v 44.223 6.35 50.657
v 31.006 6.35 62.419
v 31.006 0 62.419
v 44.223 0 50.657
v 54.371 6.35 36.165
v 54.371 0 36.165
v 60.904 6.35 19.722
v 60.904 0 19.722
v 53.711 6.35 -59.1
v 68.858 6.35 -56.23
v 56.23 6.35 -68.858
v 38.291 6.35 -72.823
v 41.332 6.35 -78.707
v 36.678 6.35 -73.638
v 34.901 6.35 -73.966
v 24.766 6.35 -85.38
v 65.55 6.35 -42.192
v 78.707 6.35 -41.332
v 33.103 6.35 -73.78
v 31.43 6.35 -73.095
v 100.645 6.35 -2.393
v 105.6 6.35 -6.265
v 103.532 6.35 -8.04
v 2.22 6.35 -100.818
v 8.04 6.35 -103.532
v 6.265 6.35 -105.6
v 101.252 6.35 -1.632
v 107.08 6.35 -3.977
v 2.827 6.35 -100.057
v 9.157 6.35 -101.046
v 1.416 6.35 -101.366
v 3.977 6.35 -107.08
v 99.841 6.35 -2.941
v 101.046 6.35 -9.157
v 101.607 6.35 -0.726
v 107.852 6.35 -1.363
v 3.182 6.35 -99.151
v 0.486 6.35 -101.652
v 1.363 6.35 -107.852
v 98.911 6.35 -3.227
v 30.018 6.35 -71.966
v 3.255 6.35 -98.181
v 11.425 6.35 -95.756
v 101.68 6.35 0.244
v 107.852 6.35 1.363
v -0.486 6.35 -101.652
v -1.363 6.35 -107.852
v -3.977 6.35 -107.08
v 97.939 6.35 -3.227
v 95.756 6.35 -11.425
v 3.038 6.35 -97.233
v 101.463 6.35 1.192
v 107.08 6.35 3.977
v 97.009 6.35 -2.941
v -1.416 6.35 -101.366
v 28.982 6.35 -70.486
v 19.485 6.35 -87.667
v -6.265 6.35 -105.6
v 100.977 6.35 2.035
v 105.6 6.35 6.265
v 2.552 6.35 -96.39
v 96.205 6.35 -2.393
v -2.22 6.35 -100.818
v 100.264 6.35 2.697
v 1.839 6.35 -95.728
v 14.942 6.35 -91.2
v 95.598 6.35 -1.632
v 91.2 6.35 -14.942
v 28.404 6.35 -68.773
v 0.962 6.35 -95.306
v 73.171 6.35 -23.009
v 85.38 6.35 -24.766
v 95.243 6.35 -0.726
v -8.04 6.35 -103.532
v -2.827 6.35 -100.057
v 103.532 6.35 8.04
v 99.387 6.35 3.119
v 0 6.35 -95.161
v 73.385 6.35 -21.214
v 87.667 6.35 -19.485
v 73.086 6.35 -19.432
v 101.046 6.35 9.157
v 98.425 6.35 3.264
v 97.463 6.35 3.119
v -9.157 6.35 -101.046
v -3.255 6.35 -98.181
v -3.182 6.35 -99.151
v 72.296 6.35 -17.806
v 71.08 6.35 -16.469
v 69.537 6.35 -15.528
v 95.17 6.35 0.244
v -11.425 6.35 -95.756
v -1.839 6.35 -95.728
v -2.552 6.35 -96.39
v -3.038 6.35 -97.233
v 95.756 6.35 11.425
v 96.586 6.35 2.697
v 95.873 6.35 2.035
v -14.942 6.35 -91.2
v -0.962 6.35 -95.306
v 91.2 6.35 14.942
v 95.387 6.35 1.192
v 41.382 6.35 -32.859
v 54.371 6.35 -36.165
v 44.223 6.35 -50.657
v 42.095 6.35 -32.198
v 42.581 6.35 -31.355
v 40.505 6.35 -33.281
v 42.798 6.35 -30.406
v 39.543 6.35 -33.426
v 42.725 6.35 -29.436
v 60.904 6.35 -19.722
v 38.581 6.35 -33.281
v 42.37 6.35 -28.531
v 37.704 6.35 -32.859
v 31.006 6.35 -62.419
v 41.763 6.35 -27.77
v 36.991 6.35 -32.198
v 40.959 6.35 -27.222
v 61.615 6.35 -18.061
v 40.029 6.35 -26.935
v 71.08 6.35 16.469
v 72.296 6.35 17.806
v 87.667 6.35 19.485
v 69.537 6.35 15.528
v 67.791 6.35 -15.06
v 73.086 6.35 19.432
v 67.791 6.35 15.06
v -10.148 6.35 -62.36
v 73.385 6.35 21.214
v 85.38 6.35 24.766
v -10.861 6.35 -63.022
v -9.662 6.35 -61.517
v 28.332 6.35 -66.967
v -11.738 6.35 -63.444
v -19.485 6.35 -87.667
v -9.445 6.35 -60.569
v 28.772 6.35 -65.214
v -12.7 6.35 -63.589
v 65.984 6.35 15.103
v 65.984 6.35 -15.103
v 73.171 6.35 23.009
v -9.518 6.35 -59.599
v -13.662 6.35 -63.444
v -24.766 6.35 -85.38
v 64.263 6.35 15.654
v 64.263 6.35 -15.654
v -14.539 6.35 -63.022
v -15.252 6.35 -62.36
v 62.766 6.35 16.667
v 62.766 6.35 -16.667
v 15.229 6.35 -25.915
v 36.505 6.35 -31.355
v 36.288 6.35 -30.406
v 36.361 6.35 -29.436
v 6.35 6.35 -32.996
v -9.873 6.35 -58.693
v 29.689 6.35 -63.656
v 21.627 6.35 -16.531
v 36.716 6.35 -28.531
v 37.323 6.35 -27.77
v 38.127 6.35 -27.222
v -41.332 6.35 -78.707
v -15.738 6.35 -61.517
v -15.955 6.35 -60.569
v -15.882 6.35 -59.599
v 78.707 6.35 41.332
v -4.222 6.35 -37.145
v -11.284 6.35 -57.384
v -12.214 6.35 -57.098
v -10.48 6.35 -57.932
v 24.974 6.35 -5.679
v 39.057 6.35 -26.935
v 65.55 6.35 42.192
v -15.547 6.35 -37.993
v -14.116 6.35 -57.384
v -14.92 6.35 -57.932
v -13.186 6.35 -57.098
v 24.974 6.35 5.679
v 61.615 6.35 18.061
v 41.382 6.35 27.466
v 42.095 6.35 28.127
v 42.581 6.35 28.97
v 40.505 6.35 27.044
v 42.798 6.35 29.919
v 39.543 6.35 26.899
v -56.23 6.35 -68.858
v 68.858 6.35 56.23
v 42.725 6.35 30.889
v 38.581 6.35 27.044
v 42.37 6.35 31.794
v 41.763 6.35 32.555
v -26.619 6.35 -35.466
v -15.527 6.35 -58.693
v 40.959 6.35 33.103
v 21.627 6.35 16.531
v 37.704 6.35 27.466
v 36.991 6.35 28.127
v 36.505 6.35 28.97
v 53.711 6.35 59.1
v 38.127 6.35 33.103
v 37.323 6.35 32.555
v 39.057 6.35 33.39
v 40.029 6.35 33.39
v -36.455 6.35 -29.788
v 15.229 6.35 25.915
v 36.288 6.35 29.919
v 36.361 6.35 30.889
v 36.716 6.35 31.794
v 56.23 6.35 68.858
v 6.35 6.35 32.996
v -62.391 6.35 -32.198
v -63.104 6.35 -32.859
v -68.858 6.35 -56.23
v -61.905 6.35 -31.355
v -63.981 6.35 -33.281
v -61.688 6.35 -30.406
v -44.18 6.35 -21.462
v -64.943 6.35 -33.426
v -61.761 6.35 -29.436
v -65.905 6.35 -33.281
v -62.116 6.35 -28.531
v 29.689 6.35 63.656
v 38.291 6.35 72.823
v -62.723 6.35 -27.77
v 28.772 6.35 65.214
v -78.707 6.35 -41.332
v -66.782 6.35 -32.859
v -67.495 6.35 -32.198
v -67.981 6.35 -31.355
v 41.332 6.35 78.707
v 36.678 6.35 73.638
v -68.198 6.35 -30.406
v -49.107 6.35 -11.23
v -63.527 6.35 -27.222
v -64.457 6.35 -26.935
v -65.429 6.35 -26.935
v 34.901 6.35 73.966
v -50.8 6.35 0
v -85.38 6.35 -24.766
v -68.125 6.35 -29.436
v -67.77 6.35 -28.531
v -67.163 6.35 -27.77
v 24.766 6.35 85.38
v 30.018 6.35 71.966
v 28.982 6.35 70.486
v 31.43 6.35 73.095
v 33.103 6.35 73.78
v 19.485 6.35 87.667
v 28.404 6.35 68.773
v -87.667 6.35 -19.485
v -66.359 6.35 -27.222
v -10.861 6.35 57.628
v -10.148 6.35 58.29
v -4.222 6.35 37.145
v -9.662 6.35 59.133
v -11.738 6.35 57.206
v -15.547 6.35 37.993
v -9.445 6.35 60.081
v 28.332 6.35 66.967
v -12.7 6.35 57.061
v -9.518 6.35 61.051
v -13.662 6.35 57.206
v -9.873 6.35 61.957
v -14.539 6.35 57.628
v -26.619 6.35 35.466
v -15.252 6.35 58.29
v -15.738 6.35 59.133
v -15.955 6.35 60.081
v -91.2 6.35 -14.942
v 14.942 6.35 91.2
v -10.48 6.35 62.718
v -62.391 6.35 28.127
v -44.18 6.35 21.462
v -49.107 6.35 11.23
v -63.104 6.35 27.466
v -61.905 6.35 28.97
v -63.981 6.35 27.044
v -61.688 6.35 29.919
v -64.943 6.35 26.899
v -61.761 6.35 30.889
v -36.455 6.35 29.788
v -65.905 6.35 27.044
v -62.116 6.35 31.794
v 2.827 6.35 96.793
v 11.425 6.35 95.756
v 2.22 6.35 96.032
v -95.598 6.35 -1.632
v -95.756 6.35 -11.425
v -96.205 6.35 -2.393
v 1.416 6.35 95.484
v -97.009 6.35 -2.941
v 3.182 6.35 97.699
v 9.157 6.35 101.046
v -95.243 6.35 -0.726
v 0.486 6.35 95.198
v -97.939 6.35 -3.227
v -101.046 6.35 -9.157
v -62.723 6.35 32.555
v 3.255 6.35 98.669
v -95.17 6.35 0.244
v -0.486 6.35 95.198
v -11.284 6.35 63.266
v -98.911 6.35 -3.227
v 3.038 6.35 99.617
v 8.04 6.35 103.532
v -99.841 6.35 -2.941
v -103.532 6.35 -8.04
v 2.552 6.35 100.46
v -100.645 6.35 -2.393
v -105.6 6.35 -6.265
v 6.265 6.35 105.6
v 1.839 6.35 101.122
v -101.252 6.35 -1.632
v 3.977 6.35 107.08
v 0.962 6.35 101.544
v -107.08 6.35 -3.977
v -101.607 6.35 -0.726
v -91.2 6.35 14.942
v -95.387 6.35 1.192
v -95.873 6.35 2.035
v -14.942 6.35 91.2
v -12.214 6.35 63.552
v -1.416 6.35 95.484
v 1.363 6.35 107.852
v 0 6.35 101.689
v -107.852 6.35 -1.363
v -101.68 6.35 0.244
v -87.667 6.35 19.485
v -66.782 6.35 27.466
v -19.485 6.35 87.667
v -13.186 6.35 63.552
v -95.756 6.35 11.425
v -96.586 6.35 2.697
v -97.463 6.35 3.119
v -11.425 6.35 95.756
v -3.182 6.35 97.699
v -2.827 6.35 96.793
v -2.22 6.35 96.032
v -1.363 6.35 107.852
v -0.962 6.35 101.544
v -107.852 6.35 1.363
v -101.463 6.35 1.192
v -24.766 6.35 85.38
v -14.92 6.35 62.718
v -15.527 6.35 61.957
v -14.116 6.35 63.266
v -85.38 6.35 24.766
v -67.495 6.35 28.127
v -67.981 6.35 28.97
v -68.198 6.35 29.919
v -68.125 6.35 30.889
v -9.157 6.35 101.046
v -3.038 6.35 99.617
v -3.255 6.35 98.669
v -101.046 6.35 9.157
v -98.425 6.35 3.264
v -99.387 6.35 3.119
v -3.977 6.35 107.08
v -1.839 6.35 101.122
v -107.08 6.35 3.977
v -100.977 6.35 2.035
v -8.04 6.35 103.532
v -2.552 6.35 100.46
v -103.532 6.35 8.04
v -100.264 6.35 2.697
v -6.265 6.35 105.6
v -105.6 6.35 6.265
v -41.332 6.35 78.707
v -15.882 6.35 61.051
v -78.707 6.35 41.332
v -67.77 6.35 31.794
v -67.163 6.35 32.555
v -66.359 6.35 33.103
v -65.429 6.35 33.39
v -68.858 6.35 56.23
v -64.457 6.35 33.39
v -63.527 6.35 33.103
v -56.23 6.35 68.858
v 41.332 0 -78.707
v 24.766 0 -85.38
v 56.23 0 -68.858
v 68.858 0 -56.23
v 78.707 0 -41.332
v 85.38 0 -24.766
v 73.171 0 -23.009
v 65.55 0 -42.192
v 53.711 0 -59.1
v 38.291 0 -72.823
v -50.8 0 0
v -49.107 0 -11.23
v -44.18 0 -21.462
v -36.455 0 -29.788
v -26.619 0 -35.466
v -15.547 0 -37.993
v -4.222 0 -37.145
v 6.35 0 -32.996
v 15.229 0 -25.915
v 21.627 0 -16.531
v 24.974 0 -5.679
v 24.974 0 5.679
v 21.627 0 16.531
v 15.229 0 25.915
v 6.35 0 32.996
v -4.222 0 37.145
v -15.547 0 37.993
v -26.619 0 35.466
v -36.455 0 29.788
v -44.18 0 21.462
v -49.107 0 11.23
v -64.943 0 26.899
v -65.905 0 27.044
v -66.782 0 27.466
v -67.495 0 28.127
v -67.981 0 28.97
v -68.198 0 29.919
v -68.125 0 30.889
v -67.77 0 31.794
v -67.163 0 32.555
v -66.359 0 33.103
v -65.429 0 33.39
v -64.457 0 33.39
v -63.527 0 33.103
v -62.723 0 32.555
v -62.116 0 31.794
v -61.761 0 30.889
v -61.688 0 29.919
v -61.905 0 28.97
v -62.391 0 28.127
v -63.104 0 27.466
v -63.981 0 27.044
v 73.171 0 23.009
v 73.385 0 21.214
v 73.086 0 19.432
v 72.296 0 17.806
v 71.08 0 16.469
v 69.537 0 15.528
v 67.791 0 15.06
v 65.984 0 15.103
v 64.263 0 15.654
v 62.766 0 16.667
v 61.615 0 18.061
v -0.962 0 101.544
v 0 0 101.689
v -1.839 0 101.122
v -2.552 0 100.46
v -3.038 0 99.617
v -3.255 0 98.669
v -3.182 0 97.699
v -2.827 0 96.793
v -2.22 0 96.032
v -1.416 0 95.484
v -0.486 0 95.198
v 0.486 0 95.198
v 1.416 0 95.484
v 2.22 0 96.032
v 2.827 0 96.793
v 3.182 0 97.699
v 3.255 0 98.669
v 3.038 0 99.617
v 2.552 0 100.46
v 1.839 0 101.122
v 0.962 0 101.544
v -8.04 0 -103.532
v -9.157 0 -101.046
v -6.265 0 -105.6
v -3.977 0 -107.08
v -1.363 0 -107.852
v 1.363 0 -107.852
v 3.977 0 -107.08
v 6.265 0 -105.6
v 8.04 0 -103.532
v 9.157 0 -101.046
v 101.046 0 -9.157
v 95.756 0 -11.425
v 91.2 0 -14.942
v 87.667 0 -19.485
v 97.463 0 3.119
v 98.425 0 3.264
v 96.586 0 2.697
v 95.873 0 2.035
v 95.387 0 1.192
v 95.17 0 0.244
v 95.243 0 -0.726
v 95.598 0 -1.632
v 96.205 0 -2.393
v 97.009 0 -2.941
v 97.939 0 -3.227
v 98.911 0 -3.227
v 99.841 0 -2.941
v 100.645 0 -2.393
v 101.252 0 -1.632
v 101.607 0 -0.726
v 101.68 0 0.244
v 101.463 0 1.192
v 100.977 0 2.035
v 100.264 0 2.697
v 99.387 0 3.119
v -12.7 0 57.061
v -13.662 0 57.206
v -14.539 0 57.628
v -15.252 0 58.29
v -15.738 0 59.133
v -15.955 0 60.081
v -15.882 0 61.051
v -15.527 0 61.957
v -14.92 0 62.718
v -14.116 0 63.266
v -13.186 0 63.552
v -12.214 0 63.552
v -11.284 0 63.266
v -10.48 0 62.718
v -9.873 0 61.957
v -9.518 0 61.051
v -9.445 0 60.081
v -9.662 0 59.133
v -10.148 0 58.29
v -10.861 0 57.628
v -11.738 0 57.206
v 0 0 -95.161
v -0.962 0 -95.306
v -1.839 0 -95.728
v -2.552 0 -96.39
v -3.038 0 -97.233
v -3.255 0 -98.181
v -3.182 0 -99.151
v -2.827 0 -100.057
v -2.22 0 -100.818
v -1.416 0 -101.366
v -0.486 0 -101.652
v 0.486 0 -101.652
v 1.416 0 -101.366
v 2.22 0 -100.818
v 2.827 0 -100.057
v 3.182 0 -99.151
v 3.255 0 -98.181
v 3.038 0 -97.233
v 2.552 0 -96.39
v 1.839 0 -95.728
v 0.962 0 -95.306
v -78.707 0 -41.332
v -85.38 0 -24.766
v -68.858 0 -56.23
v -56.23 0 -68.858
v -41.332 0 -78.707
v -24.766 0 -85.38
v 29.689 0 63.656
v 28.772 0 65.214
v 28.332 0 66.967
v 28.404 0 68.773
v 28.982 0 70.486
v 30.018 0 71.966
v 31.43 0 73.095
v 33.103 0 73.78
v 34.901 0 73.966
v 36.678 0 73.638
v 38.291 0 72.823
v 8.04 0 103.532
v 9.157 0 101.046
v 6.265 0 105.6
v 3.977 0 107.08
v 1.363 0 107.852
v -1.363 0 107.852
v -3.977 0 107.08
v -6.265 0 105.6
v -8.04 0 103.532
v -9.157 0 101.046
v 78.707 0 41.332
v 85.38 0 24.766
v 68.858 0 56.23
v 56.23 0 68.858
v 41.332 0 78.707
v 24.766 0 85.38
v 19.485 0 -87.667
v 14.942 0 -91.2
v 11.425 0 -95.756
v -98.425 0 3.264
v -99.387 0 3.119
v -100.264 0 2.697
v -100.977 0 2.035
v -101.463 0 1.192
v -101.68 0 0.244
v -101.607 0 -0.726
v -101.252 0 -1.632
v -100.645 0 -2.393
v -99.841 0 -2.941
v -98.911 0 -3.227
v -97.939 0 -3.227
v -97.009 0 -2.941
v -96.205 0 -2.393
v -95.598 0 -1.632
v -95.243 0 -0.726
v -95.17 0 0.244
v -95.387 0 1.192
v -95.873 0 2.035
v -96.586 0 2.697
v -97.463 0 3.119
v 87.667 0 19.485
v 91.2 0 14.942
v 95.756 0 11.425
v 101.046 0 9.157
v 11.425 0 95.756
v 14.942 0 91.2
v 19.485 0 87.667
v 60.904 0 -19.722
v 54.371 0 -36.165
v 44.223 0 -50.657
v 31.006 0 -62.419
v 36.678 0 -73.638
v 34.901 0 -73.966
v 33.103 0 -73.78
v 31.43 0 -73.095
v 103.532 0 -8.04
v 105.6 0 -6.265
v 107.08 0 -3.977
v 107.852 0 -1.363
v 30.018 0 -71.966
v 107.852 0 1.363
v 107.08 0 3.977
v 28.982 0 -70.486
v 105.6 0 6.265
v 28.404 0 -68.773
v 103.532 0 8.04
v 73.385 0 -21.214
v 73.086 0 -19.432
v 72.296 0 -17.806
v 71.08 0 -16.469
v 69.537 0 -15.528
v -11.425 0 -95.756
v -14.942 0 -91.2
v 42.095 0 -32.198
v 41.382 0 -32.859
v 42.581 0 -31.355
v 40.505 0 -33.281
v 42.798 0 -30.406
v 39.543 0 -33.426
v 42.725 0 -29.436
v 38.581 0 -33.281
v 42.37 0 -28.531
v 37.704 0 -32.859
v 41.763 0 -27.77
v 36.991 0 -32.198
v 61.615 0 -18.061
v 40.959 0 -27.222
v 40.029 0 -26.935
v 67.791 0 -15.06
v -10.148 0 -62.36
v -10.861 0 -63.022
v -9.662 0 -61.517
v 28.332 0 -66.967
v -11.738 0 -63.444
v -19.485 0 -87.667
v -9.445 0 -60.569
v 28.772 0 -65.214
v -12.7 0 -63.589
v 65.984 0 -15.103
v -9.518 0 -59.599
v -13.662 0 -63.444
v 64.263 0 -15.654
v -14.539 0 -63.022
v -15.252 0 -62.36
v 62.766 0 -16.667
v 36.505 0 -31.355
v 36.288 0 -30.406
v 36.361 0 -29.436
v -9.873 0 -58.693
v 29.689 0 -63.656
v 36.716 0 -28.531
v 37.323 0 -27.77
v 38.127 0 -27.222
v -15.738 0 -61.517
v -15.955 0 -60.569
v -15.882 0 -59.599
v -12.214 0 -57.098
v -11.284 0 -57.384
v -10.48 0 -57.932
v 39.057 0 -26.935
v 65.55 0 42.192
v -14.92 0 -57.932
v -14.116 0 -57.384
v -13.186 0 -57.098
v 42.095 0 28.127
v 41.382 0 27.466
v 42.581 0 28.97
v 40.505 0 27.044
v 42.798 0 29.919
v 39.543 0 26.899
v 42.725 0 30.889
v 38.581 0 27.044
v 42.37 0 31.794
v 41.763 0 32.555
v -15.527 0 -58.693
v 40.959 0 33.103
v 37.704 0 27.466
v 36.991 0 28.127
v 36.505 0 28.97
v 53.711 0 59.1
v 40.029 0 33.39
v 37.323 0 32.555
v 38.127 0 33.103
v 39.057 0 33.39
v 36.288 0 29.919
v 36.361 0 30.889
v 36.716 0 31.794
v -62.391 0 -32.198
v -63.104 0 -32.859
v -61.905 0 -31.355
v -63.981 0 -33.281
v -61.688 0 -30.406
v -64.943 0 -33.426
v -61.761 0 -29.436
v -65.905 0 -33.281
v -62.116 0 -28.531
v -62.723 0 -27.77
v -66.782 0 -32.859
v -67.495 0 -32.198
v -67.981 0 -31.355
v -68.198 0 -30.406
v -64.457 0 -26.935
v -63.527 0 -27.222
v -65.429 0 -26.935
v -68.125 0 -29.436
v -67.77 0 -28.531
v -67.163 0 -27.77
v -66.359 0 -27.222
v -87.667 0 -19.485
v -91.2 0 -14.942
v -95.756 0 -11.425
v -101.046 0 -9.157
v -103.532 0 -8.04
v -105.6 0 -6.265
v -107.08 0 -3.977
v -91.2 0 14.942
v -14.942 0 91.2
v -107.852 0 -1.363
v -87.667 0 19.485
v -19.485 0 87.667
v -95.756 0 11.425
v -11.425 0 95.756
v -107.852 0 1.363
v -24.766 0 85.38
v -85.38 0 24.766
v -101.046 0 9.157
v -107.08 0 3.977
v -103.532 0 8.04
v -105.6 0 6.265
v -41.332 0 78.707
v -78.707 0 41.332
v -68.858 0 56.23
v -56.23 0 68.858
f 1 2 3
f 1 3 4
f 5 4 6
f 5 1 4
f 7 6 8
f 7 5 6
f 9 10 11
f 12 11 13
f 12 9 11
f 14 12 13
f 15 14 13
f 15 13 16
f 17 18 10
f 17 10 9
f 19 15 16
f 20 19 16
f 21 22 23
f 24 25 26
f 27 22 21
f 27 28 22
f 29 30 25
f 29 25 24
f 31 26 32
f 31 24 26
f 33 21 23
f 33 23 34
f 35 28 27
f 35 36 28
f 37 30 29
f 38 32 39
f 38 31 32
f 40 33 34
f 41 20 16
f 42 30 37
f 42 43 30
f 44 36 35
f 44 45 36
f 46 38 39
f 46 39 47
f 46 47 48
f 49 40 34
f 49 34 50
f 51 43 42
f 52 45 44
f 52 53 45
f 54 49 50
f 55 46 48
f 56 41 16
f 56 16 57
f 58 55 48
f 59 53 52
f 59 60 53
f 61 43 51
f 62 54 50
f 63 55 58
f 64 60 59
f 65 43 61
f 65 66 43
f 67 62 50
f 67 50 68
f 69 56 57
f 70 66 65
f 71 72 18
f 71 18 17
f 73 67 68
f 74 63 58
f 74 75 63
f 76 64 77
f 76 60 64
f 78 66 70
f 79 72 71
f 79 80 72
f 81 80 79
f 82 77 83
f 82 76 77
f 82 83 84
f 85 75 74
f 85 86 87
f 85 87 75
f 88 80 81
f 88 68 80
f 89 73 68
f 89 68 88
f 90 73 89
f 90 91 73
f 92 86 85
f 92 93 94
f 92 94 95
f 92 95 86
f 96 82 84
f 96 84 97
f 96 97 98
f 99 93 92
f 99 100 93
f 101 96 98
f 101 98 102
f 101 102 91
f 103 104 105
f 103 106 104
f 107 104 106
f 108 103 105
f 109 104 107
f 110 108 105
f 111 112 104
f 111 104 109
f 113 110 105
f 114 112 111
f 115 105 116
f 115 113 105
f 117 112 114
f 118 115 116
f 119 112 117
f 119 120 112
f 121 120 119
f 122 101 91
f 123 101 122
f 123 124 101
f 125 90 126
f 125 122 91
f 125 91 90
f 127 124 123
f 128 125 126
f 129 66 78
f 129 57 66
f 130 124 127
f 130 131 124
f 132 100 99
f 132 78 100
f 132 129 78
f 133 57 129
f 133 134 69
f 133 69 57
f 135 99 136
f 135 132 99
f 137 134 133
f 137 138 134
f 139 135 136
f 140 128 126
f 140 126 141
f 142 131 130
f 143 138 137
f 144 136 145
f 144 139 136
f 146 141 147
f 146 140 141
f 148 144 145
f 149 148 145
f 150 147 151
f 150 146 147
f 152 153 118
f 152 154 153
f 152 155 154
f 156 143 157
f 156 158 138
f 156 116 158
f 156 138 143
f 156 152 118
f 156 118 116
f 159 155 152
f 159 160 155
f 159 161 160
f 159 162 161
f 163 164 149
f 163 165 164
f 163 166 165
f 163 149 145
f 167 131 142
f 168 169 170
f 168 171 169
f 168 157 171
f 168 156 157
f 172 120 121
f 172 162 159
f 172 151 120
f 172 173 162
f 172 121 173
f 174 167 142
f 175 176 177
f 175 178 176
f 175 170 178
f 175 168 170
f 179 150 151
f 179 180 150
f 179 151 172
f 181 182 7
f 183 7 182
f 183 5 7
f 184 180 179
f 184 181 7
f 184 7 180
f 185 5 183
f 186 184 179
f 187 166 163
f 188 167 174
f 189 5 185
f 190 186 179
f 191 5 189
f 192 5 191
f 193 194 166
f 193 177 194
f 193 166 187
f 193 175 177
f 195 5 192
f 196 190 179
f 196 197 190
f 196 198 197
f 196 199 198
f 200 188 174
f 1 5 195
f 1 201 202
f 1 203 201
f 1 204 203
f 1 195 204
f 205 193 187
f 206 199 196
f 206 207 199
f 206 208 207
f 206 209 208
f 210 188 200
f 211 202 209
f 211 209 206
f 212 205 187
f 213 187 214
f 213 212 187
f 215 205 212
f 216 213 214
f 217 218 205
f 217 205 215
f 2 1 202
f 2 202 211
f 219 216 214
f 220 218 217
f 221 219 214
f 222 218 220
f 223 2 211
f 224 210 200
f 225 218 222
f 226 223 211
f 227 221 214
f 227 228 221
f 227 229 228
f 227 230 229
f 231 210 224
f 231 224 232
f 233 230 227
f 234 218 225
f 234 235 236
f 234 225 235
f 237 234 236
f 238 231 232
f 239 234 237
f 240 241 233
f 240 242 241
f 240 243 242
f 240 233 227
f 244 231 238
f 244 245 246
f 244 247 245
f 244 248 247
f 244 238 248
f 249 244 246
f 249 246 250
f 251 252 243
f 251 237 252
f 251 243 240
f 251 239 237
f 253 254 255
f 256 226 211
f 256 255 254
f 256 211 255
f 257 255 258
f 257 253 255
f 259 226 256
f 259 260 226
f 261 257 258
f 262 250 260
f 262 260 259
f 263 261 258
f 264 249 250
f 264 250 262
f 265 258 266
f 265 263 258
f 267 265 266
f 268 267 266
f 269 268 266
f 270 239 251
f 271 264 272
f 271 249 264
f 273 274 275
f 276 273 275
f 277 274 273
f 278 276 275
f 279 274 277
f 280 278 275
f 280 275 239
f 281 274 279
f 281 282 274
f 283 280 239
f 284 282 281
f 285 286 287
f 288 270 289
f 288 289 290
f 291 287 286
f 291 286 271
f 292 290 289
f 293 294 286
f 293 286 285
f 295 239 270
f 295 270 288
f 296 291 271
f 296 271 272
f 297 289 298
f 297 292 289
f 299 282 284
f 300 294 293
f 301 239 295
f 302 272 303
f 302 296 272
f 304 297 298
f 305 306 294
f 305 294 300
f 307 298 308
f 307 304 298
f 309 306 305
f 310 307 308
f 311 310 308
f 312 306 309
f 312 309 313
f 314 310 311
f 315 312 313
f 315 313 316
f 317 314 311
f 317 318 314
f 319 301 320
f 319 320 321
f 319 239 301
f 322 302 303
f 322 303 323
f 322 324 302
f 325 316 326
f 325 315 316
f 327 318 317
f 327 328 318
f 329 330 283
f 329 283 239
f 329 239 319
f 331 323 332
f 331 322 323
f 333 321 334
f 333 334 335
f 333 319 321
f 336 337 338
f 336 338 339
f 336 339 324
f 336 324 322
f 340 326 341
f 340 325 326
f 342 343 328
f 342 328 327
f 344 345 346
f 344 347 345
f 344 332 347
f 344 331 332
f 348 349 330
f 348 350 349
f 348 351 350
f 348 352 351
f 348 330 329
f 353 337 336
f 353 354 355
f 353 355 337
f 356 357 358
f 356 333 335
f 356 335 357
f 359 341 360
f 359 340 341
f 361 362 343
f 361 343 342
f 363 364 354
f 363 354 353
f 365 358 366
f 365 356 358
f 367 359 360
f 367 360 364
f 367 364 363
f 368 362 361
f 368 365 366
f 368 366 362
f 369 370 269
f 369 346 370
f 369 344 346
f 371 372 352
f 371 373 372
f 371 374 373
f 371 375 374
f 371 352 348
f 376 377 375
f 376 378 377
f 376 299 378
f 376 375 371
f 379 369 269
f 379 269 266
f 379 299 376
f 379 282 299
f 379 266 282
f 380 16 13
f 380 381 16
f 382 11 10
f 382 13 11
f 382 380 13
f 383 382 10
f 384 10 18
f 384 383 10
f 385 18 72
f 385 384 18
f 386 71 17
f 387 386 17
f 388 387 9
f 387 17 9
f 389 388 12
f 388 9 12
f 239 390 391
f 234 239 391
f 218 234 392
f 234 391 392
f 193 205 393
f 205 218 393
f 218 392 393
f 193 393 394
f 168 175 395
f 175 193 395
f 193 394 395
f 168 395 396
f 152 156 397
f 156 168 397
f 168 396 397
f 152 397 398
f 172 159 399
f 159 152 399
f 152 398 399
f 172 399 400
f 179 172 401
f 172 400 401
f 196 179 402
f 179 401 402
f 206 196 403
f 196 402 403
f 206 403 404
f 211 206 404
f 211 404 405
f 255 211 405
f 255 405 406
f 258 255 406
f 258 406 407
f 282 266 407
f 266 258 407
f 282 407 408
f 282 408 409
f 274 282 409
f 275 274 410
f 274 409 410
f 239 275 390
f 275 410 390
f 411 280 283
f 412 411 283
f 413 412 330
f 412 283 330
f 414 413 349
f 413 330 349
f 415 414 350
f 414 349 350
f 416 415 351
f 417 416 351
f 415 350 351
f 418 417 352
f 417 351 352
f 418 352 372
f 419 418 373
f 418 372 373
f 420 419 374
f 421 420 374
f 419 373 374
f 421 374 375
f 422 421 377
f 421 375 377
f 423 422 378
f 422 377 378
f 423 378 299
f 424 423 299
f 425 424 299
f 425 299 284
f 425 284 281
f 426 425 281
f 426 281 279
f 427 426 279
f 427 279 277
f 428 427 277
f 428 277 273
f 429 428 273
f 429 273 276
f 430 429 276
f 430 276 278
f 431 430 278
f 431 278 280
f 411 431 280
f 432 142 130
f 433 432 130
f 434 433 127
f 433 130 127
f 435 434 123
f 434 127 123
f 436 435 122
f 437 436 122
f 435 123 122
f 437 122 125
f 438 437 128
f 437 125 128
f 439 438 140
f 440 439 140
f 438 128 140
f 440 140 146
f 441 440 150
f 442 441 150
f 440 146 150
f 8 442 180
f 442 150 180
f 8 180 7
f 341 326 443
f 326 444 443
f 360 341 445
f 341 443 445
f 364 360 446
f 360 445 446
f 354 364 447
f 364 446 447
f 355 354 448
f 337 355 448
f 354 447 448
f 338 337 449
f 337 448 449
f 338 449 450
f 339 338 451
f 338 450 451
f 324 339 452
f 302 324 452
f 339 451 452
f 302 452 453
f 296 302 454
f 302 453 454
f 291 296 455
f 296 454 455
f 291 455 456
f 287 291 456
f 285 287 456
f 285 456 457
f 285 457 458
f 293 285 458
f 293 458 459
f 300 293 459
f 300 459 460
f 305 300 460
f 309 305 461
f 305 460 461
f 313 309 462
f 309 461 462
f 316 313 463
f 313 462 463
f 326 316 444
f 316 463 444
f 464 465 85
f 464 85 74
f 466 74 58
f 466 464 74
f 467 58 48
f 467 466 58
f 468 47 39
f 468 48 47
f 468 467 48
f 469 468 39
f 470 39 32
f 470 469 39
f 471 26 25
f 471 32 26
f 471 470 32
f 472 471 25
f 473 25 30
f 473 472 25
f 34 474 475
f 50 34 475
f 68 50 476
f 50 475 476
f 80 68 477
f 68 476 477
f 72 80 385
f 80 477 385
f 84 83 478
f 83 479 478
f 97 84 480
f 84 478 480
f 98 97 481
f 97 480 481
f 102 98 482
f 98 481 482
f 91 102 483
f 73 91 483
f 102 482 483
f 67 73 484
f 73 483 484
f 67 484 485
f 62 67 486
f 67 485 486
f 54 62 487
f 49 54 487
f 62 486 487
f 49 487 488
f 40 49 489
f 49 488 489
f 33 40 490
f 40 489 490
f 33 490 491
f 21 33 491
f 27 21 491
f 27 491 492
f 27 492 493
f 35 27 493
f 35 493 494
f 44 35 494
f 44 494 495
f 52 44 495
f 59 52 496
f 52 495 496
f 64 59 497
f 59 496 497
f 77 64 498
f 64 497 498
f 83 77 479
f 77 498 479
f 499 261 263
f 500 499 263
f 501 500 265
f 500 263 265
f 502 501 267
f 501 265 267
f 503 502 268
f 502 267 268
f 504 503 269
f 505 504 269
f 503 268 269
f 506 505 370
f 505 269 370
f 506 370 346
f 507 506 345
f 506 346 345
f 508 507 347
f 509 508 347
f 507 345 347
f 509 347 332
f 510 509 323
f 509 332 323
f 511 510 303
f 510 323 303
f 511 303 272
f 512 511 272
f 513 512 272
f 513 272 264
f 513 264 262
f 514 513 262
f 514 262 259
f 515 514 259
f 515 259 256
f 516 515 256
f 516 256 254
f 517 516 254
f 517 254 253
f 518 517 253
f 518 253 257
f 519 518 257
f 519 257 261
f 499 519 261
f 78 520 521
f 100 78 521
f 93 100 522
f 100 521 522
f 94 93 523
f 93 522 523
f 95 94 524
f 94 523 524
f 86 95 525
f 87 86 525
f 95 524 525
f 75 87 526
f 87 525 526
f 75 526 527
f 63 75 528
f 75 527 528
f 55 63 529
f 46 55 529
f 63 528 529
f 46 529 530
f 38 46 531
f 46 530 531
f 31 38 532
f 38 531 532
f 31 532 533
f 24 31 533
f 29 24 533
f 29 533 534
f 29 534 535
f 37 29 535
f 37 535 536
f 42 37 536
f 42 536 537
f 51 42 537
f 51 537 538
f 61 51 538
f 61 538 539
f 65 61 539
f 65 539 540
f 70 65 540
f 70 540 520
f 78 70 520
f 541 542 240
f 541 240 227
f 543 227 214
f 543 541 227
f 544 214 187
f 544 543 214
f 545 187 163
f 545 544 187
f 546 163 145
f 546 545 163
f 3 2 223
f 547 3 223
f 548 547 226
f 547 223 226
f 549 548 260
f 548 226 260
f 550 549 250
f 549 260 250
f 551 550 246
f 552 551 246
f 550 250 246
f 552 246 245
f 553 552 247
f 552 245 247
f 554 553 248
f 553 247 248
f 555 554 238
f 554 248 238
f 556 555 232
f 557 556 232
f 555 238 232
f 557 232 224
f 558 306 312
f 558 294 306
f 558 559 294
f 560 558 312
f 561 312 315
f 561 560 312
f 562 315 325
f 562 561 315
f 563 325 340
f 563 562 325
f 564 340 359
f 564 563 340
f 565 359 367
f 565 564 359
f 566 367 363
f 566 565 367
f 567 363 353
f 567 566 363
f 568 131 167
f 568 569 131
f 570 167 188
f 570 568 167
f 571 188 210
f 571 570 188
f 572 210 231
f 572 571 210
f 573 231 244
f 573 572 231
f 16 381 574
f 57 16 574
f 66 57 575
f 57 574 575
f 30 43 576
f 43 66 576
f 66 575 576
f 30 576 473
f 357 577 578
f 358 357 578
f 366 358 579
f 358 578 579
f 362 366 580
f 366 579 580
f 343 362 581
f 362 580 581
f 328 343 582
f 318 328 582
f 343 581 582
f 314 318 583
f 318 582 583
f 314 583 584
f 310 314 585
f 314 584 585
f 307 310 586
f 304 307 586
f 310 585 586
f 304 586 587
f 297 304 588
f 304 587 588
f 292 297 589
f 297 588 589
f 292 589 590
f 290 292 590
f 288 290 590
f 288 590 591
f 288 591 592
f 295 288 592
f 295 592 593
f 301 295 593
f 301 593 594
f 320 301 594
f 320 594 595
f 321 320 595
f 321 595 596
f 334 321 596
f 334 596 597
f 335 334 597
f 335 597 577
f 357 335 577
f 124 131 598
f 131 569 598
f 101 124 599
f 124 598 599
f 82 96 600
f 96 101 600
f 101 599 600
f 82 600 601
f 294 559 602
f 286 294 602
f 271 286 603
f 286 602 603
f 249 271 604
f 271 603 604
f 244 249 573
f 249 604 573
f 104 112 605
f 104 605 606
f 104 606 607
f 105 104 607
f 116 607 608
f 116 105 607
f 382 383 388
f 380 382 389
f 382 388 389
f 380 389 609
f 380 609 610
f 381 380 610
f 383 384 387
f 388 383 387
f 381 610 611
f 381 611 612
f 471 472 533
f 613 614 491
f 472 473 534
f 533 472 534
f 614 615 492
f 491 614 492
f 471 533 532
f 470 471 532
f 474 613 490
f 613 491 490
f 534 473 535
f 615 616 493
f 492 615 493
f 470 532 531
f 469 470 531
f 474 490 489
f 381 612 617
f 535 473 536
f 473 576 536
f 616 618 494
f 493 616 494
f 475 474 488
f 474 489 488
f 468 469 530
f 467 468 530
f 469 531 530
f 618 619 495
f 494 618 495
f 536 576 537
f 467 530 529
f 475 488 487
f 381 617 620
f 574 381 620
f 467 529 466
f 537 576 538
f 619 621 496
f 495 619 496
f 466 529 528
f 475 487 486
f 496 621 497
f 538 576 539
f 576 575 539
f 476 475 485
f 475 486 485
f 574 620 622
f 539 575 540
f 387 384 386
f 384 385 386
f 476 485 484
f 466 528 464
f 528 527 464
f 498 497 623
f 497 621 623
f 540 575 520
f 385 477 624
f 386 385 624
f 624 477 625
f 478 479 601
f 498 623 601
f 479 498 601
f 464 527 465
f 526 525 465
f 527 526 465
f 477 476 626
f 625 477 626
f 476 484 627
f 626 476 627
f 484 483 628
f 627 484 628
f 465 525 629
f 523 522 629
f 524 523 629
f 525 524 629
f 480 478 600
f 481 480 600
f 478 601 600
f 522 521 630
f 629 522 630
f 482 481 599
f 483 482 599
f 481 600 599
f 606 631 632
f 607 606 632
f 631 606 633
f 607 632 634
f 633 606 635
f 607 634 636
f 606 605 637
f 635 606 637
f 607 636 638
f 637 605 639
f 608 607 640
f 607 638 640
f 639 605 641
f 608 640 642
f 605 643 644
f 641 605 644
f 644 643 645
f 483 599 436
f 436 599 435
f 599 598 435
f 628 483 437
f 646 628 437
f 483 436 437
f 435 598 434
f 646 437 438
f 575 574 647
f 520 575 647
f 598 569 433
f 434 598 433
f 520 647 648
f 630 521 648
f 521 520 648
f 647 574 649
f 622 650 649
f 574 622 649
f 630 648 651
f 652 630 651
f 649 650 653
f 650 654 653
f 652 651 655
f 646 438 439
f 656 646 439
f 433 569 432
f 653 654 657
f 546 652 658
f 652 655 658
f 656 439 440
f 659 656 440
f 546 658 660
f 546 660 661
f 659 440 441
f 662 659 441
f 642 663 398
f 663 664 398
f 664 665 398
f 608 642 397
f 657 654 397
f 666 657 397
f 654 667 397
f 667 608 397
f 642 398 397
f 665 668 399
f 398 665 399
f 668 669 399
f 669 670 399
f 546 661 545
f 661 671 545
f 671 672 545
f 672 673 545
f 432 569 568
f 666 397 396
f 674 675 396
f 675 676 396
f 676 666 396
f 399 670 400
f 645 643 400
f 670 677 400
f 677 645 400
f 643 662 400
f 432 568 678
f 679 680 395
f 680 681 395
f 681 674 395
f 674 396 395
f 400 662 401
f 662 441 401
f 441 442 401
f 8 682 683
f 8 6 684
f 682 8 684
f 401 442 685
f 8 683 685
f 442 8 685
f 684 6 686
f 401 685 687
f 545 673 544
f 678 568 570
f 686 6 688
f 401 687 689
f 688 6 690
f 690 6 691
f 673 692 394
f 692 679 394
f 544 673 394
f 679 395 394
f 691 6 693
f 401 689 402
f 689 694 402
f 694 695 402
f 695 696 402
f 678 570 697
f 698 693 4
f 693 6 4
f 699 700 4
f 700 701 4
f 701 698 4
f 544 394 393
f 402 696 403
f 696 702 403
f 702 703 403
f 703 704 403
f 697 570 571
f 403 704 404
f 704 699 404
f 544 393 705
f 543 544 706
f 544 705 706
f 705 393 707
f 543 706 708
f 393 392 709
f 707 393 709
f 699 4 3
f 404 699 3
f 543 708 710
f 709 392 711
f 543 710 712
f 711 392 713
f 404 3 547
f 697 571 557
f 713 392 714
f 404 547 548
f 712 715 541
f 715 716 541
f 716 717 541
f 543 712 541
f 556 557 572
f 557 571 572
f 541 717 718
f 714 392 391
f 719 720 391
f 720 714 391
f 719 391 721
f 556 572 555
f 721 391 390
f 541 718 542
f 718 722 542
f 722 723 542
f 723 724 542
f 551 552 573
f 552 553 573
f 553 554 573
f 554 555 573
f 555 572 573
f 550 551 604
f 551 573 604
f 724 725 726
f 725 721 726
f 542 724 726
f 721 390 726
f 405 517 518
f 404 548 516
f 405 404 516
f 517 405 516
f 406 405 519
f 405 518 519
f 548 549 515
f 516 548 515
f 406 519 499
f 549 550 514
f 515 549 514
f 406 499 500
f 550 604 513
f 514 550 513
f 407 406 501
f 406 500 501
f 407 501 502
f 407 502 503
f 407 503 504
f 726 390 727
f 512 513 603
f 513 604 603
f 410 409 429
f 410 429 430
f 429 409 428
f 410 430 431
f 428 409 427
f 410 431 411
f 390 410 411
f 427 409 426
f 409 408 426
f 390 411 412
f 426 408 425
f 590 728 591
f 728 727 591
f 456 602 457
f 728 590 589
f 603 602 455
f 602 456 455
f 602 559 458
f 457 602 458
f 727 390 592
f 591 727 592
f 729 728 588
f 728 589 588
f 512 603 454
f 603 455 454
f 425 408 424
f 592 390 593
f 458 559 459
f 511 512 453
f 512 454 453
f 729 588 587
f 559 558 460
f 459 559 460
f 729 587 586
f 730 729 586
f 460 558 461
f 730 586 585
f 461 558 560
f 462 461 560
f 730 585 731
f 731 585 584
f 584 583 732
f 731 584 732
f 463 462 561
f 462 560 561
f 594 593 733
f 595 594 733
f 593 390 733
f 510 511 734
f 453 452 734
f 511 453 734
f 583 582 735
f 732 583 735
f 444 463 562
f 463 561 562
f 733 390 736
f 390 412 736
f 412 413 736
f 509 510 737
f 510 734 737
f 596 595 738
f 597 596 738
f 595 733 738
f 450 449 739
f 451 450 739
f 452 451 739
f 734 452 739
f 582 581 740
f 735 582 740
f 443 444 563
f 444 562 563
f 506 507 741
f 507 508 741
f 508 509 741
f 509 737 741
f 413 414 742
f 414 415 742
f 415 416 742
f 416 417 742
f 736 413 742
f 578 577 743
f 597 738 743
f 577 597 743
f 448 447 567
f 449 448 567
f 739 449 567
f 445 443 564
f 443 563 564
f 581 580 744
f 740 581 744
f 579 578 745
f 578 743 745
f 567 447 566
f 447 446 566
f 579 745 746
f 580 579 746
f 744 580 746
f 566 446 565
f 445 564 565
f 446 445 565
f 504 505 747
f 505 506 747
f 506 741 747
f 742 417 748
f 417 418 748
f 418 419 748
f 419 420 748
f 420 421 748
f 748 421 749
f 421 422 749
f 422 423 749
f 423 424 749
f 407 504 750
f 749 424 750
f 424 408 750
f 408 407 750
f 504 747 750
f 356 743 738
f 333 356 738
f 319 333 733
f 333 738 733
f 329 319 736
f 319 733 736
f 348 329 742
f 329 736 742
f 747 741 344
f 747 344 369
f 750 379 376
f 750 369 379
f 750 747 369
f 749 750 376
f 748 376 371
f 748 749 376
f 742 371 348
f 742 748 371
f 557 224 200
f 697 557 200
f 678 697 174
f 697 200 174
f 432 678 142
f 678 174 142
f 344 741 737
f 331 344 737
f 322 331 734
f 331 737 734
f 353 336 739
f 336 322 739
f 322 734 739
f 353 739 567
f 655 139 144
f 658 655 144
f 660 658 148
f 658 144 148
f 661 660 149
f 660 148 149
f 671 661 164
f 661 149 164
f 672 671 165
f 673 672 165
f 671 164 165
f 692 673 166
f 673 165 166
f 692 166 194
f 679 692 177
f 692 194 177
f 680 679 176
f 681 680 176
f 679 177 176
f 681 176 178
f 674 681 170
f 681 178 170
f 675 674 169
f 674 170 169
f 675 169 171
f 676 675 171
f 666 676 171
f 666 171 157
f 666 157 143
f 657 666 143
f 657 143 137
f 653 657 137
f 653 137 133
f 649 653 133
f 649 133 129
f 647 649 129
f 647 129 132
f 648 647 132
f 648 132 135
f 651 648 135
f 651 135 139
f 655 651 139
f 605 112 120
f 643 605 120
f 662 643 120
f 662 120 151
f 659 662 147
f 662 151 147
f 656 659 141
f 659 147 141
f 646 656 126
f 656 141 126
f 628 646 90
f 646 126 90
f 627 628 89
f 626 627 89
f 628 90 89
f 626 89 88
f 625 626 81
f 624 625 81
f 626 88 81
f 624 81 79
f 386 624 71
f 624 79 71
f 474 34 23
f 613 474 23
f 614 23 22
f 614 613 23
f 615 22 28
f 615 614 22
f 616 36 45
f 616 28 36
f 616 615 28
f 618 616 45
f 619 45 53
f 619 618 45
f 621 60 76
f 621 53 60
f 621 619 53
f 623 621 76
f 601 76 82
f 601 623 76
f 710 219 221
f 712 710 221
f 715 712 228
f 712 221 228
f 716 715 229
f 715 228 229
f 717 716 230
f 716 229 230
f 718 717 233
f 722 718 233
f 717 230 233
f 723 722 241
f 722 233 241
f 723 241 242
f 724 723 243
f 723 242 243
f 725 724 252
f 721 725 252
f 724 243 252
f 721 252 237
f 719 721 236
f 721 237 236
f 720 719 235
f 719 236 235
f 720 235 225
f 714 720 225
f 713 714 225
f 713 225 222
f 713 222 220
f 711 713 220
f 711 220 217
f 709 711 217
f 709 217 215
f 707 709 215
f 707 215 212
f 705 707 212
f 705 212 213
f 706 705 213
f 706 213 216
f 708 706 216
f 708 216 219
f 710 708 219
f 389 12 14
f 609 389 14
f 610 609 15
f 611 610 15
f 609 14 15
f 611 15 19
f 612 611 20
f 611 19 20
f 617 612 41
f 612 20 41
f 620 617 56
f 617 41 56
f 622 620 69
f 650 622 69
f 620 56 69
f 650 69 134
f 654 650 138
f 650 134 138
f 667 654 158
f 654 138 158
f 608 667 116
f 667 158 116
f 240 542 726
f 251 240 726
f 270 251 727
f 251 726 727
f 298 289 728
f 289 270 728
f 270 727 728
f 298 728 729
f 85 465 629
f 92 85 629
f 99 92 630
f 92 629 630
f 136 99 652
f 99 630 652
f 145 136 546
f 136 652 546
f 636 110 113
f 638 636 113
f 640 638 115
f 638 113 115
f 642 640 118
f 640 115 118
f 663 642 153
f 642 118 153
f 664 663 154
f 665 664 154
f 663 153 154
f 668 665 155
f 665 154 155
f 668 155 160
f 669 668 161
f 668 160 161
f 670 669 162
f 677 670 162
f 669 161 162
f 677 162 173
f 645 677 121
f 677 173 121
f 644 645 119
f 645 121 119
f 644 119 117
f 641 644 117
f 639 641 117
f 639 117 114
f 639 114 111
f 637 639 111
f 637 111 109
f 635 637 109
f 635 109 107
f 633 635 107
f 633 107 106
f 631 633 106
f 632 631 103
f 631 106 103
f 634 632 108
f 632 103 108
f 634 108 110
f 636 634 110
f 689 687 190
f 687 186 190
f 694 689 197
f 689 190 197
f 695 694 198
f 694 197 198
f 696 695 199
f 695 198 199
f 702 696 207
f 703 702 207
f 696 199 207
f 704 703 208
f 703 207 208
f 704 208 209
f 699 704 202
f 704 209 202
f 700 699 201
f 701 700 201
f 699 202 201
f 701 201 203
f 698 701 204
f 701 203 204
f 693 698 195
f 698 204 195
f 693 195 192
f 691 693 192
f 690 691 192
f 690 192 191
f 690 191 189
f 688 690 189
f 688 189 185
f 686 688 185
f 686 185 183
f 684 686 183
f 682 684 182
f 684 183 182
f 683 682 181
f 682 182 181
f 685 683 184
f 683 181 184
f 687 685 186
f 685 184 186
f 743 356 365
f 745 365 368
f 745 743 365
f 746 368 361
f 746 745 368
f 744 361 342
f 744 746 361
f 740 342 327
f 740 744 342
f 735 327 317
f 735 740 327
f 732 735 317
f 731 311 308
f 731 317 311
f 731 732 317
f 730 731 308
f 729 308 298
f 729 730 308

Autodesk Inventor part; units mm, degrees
ref_plane "YZ Plane" through (0, 0, 0) normal (1, 0, 0) x (0, 1, 0)
ref_plane "XZ Plane" through (0, 0, 0) normal (0, 1, 0) x (-1, 0, 0)
ref_plane "XY Plane" through (0, 0, 0) normal (0, 0, 1) x (1, 0, 0)
sketch "Sketch1" plane through (0, 0, 0) normal (0, 1, 0) x (-1, 0, 0)
  circle A0 centre (12.7, 0) radius 38.1
  circle A1 centre (0, 0) radius 88.9
  circle A2 centre (0, 98.425) radius 9.525
  arc A3 (9.1574, 101.0457) -> (24.7665, 85.3805) centre (31.1351, 107.3355) ccw
  arc A4 (-24.7665, 85.3805) -> (-9.1574, 101.0457) centre (-31.1351, 107.3355) ccw
  circle A5 centre (-98.425, 0) radius 9.525
  circle A6 centre (0, -98.425) radius 9.525
  circle A7 centre (98.425, 0) radius 9.525
  arc A8 (85.3805, 24.7665) -> (101.0457, 9.1574) centre (107.3355, 31.1351) ccw
  arc A9 (24.7665, -85.3805) -> (9.1574, -101.0457) centre (31.1351, -107.3355) ccw
  arc A10 (-9.1574, -101.0457) -> (-24.7665, -85.3805) centre (-31.1351, -107.3355) ccw
  arc A11 (-85.3805, -24.7665) -> (-101.0457, -9.1574) centre (-107.3355, -31.1351) ccw
  arc A12 (-101.0457, 9.1574) -> (-85.3805, 24.7665) centre (-107.3355, 31.1351) ccw
  arc A13 (101.0457, -9.1574) -> (85.3805, -24.7665) centre (107.3355, -31.1351) ccw
  line L0 (98.425, 0) -> (88.9, 0)
  line L1 (0, 98.425) -> (0, 88.9)
  line L2 (0, -98.425) -> (0, -88.9)
  line L3 (-98.425, 0) -> (-88.9, 0)
  line L4 (12.7, 0) -> (0, 0)
  dimension "d20" = 177.8
  dimension "d0" = 76.2
  dimension "d2" = 19.05
  dimension "d3" = 22.86
  dimension "d21" = 12.7
extrude "Extrusion1" add sketch "Sketch1" along normal blind 6.35
sketch "Sketch3" plane through (0, 6.35, 0) normal (0, 1, 0) x (1, 0, 0)
  circle A0 centre (-12.7, 0) radius 38.1 projected
  arc A1 (101.0457, -9.1574) -> (101.0457, 9.1574) centre (98.425, 0) ccw projected
  arc A2 (101.0457, -9.1574) -> (85.3805, -24.7665) centre (107.3355, -31.1351) ccw projected
  arc A3 (24.7665, -85.3805) -> (85.3805, -24.7665) centre (0, 0) ccw projected
  arc A4 (24.7665, -85.3805) -> (9.1574, -101.0457) centre (31.1351, -107.3355) ccw projected
  arc A5 (-9.1574, -101.0457) -> (9.1574, -101.0457) centre (0, -98.425) ccw projected
  arc A6 (-9.1574, -101.0457) -> (-24.7665, -85.3805) centre (-31.1351, -107.3355) ccw projected
  arc A7 (-85.3805, -24.7665) -> (-24.7665, -85.3805) centre (0, 0) ccw projected
  arc A8 (-85.3805, -24.7665) -> (-101.0457, -9.1574) centre (-107.3355, -31.1351) ccw projected
  arc A9 (-101.0457, 9.1574) -> (-101.0457, -9.1574) centre (-98.425, 0) ccw projected
  arc A10 (-101.0457, 9.1574) -> (-85.3805, 24.7665) centre (-107.3355, 31.1351) ccw projected
  arc A11 (-24.7665, 85.3805) -> (-85.3805, 24.7665) centre (0, 0) ccw projected
  arc A12 (-24.7665, 85.3805) -> (-9.1574, 101.0457) centre (-31.1351, 107.3355) ccw projected
  arc A13 (9.1574, 101.0457) -> (-9.1574, 101.0457) centre (0, 98.425) ccw projected
  arc A14 (9.1574, 101.0457) -> (24.7665, 85.3805) centre (31.1351, 107.3355) ccw projected
  arc A15 (85.3805, 24.7665) -> (24.7665, 85.3805) centre (0, 0) ccw projected
  arc A16 (85.3805, 24.7665) -> (101.0457, 9.1574) centre (107.3355, 31.1351) ccw projected
hole "Hole1" at (98.425, 6.35, 0) at (0, 6.35, 98.425) at (-98.425, 6.35, 0) at (0, 6.35, -98.425) direction (0, -1, 0) diameter 6.5278 depth 12.2936 tip angle 118 clearance for "Socket Head Cap Screw" size "1/4" standard "Ansi Unified Screw Threads"
sketch "Sketch6" plane through (0, 0, 0) normal (0, -1, 0) x (1, 0, 0)
  circle A0 centre (-12.7, 0) radius 38.1 projected
  circle A1 centre (-12.7, 0) radius 50
  circle A2 centre (-12.7, 0) radius 69.85
  circle A3 centre (-12.7, 0) radius 60.325
  line L0 (-12.7, 0) -> (-12.7, 60.325)
  circle A4 centre (-12.7, 0) radius 60.325
  circle A5 centre (-12.7, 0) radius 60.325
  circle A6 centre (-12.7, 0) radius 60.325
  circle A7 centre (-12.7, 0) radius 60.325
  circle A8 centre (-12.7, 0) radius 60.325
  point P0 (0, 0)
  point P1 (39.543, 30.1625)
  point P2 (39.543, -30.1625)
  point P3 (-12.7, -60.325)
  point P4 (-64.943, -30.1625)
  point P5 (-64.943, 30.1625)
  dimension "d22" = 100
  dimension "d27" = 360
  dimension "d36" = 139.7
  dimension "d37" = 9.525
hole "Hole2" at (-12.7, 0, 60.325) at (39.543, 0, 30.1625) at (39.543, 0, -30.1625) at (-12.7, 0, -60.325) at (-64.943, 0, -30.1625) at (-64.943, 0, 30.1625) direction (0, 1, 0) diameter 6.5278 depth 12.2936 tip angle 118 clearance for "Socket Head Cap Screw" size "1/4" standard "Ansi Unified Screw Threads"
sketch "Sketch8" plane through (0, 6.35, 0) normal (0, 1, 0) x (1, 0, 0)
  circle A0 centre (-12.7, 0) radius 38.1
  circle A1 centre (-12.7, 0) radius 76.2
  circle A2 centre (-12.7, 0) radius 88.9
  arc A3 (38.2909, 72.8226) -> (31.0065, 62.4194) centre (34.6487, 67.621) ccw
  arc A4 (31.0065, -62.4194) -> (38.2909, -72.8226) centre (34.6487, -67.621) ccw
  line L0 (2.6706, 21.8863) -> (60.2892, 21.8863)
  line L1 (-12.7, 0) -> (34.6487, 67.621)
  line L2 (34.6487, -67.621) -> (-12.7, 0)
  arc A5 (73.1708, -23.009) -> (60.9035, -19.722) centre (67.0372, -21.3655) ccw
  arc A6 (60.9035, 19.722) -> (73.1708, 23.009) centre (67.0372, 21.3655) ccw
  line L3 (-12.7, 0) -> (67.0372, 21.3655)
  line L4 (-12.7, 0) -> (67.0372, -21.3655)
  circle A7 centre (-12.7, 0) radius 38.1 projected
  point P0 (0, 0)
  dimension "d38" = 38.1
  dimension "d39" = 12.7
  dimension "d40" = 55
  dimension "d41" = 55
  dimension "d42" = 40
  dimension "d43" = 40
extrude "Extrusion3" cut sketch "Sketch8" against normal blind 25.4 contours A1 A3 A2 A6 | A5 A2 A4 A1
properties part number "LargeBearingPlate" material "Stainless Steel"
